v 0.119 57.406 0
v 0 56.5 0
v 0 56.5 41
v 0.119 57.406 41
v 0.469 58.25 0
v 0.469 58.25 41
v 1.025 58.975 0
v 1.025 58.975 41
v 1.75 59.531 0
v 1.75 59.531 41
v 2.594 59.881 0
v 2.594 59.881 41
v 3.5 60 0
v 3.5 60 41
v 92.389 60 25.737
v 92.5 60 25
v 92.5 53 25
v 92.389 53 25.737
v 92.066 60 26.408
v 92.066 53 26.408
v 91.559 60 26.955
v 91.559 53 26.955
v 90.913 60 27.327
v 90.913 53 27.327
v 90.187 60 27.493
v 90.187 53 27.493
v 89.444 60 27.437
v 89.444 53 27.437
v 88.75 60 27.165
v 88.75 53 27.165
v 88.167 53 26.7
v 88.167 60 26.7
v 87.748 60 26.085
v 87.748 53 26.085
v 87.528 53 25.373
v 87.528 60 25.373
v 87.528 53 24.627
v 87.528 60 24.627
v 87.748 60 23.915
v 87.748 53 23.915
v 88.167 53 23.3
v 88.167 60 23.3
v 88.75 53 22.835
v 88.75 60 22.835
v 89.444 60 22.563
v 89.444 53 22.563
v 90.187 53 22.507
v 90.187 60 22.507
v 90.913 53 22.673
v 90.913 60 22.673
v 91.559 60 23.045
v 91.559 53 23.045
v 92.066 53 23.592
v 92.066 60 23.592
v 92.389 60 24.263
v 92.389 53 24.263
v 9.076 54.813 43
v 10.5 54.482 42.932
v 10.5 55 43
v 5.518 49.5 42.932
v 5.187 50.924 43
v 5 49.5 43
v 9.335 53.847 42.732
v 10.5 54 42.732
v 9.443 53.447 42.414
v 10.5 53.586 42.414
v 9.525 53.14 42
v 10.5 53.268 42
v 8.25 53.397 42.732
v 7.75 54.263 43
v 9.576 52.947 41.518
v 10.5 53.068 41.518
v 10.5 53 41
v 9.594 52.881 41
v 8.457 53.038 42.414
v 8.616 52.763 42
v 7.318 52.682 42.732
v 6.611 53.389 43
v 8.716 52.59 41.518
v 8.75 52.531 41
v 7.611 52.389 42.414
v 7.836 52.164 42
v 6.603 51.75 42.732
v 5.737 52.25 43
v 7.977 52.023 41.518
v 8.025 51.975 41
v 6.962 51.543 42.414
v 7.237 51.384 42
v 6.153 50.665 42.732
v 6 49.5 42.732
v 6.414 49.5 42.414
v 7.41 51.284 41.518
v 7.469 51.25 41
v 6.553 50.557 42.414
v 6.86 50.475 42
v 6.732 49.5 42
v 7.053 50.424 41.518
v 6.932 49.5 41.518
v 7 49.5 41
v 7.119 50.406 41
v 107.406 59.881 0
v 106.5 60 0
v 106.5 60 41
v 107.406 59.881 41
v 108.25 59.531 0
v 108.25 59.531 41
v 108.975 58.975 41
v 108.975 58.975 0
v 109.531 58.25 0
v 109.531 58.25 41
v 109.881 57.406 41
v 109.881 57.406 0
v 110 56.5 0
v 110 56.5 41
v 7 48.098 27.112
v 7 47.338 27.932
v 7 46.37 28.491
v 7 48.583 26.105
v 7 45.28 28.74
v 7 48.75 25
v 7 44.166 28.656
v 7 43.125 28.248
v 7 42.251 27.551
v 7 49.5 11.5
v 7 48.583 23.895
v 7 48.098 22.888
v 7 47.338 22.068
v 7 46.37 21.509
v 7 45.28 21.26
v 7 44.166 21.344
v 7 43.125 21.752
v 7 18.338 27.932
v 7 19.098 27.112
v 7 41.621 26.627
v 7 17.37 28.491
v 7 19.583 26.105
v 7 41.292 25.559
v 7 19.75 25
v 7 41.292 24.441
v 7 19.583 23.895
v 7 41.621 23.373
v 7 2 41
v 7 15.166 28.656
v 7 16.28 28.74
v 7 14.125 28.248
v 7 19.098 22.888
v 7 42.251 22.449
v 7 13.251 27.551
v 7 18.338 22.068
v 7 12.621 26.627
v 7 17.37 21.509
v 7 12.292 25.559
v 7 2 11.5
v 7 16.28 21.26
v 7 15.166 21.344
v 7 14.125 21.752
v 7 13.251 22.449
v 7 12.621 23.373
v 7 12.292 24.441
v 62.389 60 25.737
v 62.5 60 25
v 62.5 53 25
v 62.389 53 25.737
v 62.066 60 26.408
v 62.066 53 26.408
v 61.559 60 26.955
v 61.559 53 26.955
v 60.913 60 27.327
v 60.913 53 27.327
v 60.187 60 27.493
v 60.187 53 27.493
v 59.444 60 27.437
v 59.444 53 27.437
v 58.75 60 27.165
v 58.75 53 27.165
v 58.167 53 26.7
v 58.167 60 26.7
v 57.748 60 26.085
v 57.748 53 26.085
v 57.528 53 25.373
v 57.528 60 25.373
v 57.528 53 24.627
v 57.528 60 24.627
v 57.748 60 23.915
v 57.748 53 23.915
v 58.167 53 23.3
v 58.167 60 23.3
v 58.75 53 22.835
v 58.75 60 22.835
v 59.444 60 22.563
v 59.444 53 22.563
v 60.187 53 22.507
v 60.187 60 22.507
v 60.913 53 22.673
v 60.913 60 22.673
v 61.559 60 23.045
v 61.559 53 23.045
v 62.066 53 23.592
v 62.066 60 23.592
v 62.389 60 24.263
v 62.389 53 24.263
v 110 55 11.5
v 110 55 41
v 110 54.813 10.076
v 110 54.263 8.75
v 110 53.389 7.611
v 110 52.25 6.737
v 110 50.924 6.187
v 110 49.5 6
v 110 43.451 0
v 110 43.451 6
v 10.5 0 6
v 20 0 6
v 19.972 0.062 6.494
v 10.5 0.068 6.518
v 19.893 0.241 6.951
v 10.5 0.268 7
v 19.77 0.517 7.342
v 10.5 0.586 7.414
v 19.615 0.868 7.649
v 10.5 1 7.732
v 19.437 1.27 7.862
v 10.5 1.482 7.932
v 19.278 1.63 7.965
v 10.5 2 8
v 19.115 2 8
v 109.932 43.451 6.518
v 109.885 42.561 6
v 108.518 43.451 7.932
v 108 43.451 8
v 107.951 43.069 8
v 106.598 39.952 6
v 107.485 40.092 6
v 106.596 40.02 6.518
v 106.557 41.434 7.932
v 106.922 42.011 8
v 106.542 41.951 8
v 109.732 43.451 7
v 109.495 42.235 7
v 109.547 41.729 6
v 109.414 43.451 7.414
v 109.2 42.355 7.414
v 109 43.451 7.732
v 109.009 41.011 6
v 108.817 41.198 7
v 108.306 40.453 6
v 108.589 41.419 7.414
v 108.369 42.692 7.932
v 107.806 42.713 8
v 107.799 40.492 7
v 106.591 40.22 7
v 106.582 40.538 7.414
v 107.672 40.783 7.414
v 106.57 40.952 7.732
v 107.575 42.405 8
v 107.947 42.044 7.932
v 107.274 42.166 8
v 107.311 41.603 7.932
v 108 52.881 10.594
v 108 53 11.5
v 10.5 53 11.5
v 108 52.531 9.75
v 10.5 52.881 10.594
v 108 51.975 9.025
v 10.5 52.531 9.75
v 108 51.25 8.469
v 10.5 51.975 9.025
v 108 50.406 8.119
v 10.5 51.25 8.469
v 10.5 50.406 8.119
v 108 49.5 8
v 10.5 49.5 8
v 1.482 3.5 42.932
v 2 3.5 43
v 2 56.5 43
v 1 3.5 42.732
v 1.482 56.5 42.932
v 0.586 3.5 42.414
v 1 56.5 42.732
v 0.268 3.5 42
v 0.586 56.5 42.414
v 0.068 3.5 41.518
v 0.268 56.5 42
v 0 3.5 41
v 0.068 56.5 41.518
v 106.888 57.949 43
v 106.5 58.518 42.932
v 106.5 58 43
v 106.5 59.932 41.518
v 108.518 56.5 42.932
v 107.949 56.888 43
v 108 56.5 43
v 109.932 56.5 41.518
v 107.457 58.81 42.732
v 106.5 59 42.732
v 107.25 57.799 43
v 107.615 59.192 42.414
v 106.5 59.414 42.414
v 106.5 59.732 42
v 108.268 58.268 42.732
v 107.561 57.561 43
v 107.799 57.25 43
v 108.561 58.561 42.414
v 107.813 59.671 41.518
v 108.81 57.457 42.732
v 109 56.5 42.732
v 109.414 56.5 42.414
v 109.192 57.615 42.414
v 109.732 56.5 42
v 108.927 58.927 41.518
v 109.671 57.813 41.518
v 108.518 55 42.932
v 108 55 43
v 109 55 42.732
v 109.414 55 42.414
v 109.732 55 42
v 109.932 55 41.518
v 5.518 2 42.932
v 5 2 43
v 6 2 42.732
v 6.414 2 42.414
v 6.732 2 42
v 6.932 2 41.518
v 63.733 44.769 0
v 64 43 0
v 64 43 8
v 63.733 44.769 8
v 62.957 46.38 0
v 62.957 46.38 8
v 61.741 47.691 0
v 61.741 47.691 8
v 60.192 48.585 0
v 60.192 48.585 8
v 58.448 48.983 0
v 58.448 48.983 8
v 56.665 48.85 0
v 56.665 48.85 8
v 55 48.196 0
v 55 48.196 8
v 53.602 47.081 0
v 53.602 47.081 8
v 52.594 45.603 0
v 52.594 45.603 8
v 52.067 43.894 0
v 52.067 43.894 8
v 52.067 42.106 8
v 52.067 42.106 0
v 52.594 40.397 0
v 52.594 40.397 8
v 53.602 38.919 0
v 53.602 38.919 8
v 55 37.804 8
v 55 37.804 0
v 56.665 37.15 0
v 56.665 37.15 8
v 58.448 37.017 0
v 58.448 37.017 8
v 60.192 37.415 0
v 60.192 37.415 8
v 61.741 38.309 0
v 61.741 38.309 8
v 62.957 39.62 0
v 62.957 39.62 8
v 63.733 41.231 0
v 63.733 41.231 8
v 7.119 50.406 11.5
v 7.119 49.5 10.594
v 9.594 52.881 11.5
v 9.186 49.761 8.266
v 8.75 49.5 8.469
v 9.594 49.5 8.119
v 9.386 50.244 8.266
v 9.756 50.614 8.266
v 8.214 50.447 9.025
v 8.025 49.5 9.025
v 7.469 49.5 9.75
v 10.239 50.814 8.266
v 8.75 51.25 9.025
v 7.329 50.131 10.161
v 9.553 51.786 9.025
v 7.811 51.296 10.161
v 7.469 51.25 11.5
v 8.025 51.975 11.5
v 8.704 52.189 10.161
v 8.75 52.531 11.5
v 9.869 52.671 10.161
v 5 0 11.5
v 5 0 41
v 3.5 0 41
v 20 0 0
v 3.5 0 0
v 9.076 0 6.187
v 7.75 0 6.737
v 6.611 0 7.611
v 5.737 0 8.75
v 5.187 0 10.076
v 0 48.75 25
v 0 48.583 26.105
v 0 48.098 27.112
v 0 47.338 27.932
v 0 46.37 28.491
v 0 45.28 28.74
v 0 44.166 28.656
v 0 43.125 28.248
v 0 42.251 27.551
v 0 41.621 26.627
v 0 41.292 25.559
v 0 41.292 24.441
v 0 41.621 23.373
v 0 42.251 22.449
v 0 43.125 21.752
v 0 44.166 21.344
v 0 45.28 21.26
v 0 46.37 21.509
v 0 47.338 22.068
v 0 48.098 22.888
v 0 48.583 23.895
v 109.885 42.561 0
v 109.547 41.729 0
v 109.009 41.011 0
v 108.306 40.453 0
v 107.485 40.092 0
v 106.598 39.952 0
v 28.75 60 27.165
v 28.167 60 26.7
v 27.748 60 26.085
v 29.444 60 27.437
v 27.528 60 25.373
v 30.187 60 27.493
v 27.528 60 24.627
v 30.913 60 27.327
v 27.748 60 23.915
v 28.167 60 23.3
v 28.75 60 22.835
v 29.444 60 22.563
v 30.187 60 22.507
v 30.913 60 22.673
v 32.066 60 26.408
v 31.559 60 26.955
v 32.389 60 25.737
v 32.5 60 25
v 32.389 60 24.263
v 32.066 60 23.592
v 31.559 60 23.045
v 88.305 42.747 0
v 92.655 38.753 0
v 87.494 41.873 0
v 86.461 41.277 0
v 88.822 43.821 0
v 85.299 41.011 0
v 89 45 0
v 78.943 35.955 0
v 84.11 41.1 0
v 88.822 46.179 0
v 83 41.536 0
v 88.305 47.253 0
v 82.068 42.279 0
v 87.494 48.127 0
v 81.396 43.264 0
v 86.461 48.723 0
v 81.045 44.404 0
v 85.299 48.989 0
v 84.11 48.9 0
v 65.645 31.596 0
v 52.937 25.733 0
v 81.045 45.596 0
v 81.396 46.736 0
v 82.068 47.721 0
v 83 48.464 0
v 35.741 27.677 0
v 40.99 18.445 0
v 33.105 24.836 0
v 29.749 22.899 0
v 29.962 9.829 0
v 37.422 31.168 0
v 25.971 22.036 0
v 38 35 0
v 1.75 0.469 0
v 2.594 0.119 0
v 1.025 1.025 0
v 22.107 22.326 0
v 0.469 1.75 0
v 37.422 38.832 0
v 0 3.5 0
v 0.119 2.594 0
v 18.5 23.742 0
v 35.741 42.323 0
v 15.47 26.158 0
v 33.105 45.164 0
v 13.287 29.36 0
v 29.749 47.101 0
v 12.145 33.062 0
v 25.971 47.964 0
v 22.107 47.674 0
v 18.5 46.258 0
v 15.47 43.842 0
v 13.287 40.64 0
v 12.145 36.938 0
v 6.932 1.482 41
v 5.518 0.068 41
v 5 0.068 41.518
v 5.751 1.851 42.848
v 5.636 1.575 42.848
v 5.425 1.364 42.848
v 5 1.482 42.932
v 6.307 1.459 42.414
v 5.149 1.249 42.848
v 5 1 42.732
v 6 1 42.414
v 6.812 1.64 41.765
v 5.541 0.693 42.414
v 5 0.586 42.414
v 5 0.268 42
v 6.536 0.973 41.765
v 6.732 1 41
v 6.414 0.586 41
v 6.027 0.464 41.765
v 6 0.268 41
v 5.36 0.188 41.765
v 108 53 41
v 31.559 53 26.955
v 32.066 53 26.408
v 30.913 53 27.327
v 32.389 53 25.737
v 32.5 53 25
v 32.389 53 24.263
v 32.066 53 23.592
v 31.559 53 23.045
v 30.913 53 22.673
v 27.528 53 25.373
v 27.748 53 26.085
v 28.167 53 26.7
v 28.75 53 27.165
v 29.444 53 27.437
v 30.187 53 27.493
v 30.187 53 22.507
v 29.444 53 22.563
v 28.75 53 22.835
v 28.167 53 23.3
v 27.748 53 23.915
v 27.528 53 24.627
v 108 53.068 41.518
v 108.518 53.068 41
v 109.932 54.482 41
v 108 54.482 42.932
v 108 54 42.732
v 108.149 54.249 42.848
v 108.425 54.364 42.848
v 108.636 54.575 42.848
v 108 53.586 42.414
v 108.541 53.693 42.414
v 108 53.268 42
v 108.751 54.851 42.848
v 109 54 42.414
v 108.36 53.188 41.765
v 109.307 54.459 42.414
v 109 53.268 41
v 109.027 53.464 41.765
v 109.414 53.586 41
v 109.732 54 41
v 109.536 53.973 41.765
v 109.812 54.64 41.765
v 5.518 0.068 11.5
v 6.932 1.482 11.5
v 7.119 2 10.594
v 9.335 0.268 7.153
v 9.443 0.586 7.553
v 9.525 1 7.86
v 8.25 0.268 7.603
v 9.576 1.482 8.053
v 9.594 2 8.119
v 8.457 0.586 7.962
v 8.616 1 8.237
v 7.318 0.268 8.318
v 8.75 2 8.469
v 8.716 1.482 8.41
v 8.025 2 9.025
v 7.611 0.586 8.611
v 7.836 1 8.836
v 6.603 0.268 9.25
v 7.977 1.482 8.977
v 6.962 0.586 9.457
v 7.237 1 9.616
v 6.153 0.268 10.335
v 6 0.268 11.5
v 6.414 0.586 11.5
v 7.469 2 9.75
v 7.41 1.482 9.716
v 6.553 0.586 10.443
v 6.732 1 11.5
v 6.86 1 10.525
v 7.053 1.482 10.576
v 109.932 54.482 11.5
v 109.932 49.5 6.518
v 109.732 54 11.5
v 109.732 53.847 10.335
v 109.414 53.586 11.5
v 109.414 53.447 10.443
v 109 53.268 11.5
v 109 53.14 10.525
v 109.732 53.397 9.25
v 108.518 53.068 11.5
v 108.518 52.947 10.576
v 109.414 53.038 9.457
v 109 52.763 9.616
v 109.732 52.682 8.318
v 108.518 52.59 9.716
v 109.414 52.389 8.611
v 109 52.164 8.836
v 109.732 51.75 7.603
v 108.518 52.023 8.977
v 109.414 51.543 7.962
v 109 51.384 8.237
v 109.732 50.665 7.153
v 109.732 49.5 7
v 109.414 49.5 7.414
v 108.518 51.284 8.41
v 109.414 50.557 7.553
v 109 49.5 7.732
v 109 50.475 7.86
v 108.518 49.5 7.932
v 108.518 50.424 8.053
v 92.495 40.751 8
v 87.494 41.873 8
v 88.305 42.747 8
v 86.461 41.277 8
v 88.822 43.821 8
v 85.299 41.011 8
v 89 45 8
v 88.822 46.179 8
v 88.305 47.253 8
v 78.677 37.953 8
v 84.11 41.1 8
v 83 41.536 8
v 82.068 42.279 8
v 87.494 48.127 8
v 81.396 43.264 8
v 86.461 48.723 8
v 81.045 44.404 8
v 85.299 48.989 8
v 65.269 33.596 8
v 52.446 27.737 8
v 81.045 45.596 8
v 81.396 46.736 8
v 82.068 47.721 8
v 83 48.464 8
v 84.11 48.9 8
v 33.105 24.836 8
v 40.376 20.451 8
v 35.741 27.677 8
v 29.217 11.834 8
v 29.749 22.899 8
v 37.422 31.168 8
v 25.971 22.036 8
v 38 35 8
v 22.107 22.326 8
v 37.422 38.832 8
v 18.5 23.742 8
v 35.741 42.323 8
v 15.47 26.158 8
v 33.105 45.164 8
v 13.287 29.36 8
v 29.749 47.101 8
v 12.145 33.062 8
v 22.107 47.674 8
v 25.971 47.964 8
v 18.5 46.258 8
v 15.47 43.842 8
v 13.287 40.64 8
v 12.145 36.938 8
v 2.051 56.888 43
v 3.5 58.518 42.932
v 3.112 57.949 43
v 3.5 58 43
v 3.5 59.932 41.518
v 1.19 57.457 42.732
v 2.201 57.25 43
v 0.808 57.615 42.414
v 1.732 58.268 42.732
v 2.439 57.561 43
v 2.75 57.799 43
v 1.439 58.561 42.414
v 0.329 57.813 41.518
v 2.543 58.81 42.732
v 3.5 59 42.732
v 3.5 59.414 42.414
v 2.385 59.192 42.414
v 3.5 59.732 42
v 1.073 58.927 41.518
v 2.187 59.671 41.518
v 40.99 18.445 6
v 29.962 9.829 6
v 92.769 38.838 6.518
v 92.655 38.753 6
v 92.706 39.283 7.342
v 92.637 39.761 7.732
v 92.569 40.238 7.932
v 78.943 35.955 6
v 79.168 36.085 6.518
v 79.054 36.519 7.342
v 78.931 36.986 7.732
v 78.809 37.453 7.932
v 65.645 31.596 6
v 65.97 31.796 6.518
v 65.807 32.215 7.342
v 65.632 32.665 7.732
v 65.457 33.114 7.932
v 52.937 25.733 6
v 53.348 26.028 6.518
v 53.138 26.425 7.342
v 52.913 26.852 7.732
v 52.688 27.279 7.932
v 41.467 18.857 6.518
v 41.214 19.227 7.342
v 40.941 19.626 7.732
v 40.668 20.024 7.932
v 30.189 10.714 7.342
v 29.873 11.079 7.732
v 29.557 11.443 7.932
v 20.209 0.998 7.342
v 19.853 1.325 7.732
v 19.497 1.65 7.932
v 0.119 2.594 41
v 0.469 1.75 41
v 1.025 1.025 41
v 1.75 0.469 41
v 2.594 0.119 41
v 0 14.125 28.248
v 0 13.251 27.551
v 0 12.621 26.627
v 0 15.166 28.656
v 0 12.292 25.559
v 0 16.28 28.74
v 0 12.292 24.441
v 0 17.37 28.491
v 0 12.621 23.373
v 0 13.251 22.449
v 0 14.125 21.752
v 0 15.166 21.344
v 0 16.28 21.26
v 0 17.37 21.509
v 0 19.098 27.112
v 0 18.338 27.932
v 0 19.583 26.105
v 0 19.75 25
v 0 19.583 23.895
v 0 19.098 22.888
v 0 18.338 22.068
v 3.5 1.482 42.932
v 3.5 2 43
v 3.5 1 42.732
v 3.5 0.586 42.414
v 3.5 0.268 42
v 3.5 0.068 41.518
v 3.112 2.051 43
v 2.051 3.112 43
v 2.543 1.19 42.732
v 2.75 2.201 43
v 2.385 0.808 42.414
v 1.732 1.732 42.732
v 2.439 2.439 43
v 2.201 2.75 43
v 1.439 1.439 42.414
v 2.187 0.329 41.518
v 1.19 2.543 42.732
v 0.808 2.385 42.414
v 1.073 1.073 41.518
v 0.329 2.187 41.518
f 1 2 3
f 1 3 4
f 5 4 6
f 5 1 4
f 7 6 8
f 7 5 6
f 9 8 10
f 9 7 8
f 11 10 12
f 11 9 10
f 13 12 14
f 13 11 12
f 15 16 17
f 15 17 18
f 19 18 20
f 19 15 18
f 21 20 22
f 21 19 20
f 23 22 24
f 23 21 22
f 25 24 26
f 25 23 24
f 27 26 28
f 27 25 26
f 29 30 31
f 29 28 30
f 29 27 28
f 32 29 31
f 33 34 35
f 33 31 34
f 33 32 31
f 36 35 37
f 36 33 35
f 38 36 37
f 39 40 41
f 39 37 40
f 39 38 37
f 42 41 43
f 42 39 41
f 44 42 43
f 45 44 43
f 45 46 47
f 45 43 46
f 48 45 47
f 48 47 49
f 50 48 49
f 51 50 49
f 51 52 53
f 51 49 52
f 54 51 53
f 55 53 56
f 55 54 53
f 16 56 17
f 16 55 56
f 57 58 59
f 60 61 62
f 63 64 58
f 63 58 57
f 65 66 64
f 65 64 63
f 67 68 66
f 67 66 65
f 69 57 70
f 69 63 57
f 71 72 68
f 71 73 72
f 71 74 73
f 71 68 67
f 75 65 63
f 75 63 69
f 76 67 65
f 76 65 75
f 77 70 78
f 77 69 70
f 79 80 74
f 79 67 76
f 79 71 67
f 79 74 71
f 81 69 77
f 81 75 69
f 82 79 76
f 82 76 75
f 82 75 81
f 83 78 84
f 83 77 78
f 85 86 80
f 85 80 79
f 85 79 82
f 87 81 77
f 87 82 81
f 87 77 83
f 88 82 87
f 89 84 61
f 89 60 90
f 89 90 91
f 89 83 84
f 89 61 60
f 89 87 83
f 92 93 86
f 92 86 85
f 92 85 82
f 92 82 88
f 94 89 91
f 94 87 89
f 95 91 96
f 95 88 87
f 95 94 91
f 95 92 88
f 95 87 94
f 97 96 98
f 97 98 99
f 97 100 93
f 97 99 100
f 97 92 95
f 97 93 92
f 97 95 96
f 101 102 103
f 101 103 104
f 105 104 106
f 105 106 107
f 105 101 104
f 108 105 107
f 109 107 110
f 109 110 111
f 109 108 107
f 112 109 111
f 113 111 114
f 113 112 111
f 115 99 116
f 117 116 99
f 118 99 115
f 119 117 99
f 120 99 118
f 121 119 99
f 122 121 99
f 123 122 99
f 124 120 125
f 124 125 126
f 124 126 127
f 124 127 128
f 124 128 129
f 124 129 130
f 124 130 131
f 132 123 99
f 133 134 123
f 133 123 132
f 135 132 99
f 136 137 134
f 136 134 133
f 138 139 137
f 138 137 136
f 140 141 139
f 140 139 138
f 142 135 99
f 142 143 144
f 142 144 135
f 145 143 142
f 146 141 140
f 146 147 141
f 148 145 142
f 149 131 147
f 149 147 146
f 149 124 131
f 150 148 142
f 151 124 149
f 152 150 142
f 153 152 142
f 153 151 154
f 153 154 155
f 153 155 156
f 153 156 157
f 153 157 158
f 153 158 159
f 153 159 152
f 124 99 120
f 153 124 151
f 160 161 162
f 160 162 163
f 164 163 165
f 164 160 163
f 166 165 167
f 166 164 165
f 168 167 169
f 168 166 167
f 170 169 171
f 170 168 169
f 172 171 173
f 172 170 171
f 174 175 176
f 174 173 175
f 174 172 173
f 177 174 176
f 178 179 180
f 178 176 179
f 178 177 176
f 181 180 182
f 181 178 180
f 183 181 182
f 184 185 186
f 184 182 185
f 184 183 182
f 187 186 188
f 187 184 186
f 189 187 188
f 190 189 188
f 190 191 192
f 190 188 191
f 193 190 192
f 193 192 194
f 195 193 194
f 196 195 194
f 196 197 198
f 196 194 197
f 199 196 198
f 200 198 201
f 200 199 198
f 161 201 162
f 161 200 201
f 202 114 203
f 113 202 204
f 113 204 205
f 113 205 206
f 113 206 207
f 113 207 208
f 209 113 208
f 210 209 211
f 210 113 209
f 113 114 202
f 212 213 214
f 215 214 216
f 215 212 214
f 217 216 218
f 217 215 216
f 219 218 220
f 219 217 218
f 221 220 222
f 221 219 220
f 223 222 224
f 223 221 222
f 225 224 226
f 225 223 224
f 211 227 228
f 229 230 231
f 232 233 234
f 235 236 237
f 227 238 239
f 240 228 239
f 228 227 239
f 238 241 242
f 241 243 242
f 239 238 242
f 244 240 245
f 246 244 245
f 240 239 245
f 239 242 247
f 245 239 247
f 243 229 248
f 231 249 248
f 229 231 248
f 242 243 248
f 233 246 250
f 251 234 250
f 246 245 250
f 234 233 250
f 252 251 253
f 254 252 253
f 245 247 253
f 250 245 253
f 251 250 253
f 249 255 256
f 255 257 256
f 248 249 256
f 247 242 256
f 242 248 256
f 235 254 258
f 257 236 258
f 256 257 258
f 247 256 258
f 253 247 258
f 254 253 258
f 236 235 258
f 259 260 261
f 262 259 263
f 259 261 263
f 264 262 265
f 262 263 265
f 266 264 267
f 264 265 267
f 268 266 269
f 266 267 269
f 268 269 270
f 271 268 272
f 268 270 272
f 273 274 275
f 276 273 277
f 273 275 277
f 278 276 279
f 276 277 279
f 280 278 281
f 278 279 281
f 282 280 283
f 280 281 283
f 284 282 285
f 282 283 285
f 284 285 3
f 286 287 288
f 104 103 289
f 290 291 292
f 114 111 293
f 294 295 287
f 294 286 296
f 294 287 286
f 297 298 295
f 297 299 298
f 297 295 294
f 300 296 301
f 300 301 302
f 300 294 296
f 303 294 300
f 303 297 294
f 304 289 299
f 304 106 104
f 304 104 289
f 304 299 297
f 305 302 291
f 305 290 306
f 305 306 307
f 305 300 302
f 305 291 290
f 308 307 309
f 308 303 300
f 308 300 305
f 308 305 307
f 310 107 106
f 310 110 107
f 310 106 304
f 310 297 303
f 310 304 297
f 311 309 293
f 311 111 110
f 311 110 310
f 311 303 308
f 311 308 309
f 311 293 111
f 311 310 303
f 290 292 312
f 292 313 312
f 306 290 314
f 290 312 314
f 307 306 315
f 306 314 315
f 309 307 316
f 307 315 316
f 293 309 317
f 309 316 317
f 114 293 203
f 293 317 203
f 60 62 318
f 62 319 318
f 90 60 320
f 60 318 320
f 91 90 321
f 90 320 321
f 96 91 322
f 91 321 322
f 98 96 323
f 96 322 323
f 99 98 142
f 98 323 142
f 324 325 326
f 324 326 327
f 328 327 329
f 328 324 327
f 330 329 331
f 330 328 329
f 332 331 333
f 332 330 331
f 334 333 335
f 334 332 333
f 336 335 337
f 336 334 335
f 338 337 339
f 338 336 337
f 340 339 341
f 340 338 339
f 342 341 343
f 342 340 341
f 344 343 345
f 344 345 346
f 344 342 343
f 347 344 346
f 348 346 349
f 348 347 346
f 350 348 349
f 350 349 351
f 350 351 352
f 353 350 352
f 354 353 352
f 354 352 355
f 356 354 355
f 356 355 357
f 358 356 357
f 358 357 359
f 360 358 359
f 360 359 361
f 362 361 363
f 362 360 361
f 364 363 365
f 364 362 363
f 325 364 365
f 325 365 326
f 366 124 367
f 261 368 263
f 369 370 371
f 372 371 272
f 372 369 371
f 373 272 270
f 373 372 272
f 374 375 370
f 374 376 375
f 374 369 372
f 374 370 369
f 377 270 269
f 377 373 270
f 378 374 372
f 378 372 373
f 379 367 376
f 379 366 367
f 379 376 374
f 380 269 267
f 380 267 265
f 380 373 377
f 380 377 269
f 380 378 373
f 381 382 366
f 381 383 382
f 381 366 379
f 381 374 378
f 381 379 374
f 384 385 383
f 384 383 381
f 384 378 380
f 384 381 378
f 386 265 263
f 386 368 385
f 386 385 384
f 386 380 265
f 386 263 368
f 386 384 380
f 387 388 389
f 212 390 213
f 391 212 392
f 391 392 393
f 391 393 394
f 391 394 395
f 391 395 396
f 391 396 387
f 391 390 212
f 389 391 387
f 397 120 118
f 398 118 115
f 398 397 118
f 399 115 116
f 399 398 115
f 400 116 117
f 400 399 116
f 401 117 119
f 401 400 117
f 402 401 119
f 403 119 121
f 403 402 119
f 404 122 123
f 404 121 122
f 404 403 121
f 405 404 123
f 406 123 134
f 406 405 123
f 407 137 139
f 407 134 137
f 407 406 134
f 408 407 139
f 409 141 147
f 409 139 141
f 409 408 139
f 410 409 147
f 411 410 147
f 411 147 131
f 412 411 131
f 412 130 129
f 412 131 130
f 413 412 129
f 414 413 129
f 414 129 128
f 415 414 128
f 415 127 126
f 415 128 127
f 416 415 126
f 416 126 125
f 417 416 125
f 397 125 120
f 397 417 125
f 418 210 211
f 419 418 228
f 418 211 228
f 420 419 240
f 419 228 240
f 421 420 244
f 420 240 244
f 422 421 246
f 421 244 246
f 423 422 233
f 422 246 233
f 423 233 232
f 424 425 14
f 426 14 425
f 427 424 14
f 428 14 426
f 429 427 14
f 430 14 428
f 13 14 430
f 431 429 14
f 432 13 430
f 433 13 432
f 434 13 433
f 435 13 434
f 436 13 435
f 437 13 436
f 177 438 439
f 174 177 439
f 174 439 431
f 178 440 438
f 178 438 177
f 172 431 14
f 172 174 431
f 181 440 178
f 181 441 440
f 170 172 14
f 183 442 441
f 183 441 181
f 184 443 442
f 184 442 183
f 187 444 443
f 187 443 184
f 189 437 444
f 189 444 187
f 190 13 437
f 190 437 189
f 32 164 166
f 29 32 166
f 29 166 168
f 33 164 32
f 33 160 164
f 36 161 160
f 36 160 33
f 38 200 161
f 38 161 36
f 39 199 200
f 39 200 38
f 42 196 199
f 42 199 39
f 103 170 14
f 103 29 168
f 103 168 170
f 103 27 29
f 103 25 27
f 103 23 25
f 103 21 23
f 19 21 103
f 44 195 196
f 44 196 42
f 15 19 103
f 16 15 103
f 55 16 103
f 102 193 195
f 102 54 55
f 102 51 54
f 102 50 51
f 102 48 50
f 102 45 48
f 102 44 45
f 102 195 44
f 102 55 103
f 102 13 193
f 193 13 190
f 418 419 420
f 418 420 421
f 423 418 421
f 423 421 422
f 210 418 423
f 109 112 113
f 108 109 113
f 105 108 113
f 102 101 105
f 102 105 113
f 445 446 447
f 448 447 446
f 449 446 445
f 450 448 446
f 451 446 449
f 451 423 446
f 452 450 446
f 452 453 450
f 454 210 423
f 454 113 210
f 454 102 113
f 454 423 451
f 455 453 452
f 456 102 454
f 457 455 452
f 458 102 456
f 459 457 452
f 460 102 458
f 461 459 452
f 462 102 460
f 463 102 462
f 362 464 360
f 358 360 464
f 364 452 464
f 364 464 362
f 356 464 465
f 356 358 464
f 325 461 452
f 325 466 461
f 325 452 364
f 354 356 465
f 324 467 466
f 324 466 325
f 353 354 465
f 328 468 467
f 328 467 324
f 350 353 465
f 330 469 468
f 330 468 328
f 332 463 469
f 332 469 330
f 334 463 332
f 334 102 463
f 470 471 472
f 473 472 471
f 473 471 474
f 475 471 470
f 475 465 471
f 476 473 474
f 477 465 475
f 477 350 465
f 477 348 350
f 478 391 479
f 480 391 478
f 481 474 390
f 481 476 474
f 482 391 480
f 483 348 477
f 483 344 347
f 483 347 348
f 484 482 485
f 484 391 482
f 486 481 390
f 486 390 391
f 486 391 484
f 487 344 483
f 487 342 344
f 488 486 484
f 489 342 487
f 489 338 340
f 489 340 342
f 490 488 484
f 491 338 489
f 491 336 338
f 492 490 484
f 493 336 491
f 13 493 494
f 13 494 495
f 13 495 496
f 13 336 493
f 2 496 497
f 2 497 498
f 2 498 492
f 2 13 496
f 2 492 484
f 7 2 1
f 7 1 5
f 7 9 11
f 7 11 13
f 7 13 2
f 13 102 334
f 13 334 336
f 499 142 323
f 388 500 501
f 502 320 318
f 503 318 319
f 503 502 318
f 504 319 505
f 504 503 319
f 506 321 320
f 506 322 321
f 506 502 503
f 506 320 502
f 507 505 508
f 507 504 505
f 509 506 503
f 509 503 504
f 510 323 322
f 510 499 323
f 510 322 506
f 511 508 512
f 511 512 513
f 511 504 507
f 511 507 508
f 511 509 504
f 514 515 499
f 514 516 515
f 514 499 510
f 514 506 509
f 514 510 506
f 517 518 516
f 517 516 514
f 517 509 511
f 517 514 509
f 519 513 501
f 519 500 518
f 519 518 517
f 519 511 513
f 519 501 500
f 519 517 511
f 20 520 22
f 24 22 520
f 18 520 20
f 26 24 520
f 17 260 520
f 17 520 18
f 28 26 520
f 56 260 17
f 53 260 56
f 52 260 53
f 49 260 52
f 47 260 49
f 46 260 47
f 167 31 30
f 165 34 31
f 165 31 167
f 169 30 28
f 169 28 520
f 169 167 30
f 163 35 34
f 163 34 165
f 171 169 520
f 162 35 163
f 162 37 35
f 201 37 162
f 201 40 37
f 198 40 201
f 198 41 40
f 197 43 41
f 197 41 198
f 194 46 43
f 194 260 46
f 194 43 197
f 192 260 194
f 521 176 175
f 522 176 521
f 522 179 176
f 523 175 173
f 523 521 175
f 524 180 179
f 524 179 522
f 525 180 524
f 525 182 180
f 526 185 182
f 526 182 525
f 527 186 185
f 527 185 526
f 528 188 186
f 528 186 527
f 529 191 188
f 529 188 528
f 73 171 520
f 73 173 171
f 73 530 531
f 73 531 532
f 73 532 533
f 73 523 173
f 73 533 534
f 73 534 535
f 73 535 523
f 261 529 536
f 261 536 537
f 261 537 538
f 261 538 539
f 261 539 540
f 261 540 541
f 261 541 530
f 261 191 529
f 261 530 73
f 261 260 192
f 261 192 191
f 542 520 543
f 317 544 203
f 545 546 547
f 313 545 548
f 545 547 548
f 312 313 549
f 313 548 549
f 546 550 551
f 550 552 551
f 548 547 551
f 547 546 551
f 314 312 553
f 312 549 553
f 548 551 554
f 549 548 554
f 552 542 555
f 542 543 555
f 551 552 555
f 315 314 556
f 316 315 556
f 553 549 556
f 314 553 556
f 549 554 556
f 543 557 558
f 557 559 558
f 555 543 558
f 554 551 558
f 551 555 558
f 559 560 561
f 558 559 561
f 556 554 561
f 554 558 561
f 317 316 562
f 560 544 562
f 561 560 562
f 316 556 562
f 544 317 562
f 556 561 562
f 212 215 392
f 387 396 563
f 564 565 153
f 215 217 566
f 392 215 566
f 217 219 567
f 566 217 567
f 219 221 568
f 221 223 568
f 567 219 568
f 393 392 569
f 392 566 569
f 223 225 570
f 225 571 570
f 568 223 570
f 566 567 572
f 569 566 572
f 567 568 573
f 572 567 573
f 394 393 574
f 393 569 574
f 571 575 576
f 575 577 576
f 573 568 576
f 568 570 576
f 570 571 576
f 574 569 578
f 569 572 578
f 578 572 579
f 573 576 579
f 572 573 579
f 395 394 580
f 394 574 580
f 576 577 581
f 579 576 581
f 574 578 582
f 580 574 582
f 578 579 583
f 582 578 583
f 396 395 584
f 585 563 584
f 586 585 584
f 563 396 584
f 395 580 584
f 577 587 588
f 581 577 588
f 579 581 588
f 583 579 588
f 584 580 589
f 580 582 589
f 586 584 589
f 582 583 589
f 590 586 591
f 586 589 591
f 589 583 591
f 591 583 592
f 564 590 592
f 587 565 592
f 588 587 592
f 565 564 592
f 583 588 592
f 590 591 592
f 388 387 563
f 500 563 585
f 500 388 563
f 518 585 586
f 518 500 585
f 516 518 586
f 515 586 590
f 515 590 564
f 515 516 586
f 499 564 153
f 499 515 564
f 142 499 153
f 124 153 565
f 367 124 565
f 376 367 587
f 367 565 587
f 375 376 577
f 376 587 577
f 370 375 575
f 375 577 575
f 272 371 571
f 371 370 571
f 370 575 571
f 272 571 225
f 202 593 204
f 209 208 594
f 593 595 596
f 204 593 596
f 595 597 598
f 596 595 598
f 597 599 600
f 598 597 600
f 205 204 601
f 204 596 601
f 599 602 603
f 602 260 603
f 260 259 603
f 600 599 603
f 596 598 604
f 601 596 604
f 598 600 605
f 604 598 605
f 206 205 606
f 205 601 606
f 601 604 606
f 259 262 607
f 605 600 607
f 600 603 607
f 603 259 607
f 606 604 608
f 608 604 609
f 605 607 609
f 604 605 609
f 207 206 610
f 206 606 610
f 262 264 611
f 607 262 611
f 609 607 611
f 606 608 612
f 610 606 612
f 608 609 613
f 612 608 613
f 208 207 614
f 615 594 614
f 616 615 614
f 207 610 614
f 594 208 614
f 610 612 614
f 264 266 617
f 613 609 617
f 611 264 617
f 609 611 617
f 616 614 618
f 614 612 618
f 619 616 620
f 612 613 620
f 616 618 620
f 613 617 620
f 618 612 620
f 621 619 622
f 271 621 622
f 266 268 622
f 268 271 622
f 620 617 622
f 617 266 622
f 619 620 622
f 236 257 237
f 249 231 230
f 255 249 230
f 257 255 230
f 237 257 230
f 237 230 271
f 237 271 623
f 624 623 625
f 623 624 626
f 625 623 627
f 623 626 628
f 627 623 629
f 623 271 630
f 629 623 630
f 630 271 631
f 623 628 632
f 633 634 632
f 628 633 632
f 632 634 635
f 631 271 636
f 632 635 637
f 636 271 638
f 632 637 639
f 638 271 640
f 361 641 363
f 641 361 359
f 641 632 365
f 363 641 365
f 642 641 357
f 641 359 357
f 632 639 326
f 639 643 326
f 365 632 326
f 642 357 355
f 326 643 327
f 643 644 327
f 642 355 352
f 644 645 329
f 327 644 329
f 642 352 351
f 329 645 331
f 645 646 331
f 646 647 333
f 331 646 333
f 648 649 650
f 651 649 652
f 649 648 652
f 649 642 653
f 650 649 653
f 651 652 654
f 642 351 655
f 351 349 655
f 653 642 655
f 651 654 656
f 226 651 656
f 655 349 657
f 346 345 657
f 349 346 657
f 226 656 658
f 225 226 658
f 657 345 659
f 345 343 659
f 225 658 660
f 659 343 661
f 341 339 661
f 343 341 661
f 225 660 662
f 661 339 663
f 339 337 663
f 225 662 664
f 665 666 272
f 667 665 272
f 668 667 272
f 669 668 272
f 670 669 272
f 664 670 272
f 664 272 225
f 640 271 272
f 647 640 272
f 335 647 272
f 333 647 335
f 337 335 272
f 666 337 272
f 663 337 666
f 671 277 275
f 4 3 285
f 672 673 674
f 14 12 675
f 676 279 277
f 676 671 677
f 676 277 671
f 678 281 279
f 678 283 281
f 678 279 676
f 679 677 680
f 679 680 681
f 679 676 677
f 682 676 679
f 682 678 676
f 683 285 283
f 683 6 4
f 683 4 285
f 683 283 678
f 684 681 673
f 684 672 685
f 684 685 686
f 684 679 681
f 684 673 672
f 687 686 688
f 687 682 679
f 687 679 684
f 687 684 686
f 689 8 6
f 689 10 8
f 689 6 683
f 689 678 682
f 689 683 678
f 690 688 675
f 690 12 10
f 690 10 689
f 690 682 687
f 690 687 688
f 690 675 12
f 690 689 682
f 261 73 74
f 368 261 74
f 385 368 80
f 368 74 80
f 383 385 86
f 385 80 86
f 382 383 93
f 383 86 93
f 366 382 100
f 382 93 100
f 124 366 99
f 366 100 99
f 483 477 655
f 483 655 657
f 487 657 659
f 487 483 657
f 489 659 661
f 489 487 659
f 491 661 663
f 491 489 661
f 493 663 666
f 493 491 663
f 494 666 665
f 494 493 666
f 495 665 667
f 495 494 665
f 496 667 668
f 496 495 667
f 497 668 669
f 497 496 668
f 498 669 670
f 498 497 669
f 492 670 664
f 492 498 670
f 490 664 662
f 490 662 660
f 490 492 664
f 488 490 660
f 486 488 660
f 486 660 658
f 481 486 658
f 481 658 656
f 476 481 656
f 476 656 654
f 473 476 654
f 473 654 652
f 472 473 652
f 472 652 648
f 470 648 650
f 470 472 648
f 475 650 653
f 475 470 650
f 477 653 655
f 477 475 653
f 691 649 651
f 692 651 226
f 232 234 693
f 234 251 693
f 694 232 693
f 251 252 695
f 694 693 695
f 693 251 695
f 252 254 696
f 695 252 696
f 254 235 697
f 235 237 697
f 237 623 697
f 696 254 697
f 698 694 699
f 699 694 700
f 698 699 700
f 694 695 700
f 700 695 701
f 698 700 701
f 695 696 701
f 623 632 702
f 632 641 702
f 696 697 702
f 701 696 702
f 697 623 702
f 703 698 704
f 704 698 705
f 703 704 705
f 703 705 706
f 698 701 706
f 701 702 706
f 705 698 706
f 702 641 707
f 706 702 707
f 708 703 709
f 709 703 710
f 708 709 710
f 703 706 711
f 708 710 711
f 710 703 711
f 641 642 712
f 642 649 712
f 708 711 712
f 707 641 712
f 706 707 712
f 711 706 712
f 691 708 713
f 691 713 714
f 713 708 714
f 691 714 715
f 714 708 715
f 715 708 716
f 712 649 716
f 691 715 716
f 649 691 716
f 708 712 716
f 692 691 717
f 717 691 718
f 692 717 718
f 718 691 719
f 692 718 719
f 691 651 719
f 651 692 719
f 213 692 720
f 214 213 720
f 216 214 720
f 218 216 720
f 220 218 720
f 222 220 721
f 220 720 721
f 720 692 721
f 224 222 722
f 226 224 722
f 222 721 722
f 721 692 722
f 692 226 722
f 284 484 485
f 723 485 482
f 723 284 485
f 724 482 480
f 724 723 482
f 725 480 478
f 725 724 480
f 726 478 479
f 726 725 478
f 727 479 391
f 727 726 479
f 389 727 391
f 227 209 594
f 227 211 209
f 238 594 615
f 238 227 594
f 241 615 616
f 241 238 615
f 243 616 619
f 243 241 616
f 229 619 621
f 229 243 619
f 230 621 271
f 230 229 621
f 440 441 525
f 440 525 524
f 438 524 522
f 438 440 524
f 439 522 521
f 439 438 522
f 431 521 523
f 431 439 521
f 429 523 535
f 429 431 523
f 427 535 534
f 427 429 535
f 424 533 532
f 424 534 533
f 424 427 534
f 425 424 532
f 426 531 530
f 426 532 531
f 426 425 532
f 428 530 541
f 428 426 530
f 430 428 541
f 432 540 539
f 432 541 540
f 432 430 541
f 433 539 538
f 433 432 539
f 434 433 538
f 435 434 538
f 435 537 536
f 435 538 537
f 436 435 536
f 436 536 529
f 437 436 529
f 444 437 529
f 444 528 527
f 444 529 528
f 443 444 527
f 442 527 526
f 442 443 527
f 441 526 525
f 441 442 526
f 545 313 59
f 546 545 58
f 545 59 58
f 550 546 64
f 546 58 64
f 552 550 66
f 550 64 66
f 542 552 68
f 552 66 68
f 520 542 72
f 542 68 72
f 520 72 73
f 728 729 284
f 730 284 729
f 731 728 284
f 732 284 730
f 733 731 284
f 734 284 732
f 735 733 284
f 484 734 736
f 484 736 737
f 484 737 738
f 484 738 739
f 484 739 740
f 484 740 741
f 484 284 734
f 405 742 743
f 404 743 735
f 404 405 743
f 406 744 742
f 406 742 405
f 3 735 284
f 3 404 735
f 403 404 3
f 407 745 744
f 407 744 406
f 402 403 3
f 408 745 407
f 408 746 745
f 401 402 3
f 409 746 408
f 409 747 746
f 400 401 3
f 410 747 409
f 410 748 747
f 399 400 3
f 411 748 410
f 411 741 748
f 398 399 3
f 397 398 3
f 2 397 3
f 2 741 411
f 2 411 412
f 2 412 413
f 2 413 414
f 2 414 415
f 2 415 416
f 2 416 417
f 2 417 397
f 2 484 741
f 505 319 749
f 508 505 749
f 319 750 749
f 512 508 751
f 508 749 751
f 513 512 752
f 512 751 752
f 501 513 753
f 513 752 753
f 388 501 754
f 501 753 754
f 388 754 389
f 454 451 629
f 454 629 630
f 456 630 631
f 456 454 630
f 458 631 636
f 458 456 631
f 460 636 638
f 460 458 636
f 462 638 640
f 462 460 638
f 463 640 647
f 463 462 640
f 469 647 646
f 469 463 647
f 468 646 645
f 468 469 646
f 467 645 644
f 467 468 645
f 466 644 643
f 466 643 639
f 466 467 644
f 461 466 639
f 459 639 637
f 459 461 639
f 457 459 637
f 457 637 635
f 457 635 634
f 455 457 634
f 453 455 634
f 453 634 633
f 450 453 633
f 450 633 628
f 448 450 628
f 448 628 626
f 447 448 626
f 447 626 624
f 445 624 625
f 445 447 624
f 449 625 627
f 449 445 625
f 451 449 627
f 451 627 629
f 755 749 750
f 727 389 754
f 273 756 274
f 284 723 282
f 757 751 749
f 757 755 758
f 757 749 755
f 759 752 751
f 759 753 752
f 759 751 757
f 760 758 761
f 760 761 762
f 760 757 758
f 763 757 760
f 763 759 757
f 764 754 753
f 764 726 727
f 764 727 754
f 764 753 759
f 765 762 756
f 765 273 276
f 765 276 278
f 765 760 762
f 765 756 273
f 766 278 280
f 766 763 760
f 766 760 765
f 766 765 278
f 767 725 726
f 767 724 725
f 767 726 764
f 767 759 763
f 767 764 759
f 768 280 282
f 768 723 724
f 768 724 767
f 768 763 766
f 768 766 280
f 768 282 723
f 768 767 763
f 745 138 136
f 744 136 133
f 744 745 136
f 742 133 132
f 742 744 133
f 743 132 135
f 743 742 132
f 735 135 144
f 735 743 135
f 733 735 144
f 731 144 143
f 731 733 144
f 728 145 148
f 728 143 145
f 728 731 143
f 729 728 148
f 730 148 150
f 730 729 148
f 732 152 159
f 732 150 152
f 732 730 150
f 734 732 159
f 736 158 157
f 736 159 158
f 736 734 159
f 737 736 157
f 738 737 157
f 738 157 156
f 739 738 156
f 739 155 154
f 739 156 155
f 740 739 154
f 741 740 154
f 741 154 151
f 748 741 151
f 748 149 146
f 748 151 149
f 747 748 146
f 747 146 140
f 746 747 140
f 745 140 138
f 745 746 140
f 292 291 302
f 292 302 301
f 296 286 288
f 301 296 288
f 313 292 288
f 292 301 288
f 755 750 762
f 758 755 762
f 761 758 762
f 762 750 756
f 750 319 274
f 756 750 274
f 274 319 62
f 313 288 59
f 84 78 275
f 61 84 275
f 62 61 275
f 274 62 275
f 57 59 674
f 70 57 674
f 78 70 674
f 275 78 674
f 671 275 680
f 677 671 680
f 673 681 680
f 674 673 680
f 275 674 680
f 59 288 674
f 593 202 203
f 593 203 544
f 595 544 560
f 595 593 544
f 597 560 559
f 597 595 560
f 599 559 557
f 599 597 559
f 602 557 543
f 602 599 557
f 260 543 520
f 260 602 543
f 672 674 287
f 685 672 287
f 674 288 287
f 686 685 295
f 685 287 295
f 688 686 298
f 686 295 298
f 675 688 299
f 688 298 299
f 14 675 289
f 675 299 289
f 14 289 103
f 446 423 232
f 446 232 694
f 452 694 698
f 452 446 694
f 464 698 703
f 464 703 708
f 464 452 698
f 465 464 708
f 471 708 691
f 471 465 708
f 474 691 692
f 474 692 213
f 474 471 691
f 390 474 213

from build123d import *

# Parameters (mm, degrees)
SKETCH052_R       = 13
SKETCH052_R_2     = 6
SKETCH052_R_3     = 4
PAD027_DEPTH      = 8
PAD028_DEPTH      = 35
CYLINDER016_R     = 3.75
CYLINDER016_DEPTH = 40
CYLINDER017_R     = 3.75
CYLINDER017_DEPTH = 30
CYLINDER018_R     = 2.5
CYLINDER018_DEPTH = 50
CYLINDER019_R     = 2.5
CYLINDER019_DEPTH = 40
CYLINDER020_R     = 2.5
CYLINDER020_DEPTH = 40
FILLET022_R       = 3.5
FILLET023_R       = 2


with BuildPart() as part:
    # Sketch052 → Pad027 (new body)
    with BuildSketch(Plane.XY):
        with BuildLine():
            Line((0, 0), (0, 60))
            Line((0, 60), (110, 60))
            Line((110, 60), (110, 40))
            ThreePointArc((110, 40), (60.755711, 29.54965), (20, 0))
            Line((20, 0), (0, 0))
        make_face()
        with Locations((25, 35)):
            Circle(SKETCH052_R, mode=Mode.SUBTRACT)
        with Locations((58, 43)):
            Circle(SKETCH052_R_2, mode=Mode.SUBTRACT)
        with Locations((85, 45)):
            Circle(SKETCH052_R_3, mode=Mode.SUBTRACT)
    extrude(amount=PAD027_DEPTH)

    # Sketch053 (on Face10 of Pad027) → Pad028 (join)
    with BuildSketch(Plane.XY.offset(8)):
        Polygon((0, 0), (0, 60), (110, 60), (110, 53), (7, 53), (7, 0), align=None)
    extrude(amount=PAD028_DEPTH)

    # Cylinder016 → Cylinder016 (cut)
    with BuildSketch(Plane(origin=(0, 45, 25), x_dir=(0, 1, 0), z_dir=(1, 0, 0))):
        Circle(CYLINDER016_R)
    extrude(amount=CYLINDER016_DEPTH, mode=Mode.SUBTRACT)

    # Cylinder017 → Cylinder017 (cut)
    with BuildSketch(Plane(origin=(0, 16, 25), x_dir=(0, 1, 0), z_dir=(1, 0, 0))):
        Circle(CYLINDER017_R)
    extrude(amount=CYLINDER017_DEPTH, mode=Mode.SUBTRACT)

    # Cylinder018 → Cylinder018 (cut)
    with BuildSketch(Plane(origin=(30, 70, 25), x_dir=(1, 0, 0), z_dir=(0, -1, 0))):
        Circle(CYLINDER018_R)
    extrude(amount=CYLINDER018_DEPTH, mode=Mode.SUBTRACT)

    # Cylinder019 → Cylinder019 (cut)
    with BuildSketch(Plane(origin=(60, 70, 25), x_dir=(1, 0, 0), z_dir=(0, -1, 0))):
        Circle(CYLINDER019_R)
    extrude(amount=CYLINDER019_DEPTH, mode=Mode.SUBTRACT)

    # Cylinder020 → Cylinder020 (cut)
    with BuildSketch(Plane(origin=(90, 70, 25), x_dir=(1, 0, 0), z_dir=(0, -1, 0))):
        Circle(CYLINDER020_R)
    extrude(amount=CYLINDER020_DEPTH, mode=Mode.SUBTRACT)

    # Fillet022
    fillet022_edges = [part.edges().sort_by_distance(p)[0] for p in [
        (0, 60, 25.5),
        (7, 53, 25.5),
        (0, 0, 25.5),
        (7, 26.5, 8),
        (58.5, 53, 8),
        (110, 40, 4),
        (110, 60, 25.5),
    ]]
    fillet(fillet022_edges, radius=FILLET022_R)

    # Fillet023
    fillet023_edges = [part.edges().sort_by_distance(p)[0] for p in [
        (59.206101, 28.847876, 8),
        (15.25, 0, 8),
        (7, 24.75, 43),
        (55, 60, 43),
    ]]
    fillet(fillet023_edges, radius=FILLET023_R)


solid = part.part
